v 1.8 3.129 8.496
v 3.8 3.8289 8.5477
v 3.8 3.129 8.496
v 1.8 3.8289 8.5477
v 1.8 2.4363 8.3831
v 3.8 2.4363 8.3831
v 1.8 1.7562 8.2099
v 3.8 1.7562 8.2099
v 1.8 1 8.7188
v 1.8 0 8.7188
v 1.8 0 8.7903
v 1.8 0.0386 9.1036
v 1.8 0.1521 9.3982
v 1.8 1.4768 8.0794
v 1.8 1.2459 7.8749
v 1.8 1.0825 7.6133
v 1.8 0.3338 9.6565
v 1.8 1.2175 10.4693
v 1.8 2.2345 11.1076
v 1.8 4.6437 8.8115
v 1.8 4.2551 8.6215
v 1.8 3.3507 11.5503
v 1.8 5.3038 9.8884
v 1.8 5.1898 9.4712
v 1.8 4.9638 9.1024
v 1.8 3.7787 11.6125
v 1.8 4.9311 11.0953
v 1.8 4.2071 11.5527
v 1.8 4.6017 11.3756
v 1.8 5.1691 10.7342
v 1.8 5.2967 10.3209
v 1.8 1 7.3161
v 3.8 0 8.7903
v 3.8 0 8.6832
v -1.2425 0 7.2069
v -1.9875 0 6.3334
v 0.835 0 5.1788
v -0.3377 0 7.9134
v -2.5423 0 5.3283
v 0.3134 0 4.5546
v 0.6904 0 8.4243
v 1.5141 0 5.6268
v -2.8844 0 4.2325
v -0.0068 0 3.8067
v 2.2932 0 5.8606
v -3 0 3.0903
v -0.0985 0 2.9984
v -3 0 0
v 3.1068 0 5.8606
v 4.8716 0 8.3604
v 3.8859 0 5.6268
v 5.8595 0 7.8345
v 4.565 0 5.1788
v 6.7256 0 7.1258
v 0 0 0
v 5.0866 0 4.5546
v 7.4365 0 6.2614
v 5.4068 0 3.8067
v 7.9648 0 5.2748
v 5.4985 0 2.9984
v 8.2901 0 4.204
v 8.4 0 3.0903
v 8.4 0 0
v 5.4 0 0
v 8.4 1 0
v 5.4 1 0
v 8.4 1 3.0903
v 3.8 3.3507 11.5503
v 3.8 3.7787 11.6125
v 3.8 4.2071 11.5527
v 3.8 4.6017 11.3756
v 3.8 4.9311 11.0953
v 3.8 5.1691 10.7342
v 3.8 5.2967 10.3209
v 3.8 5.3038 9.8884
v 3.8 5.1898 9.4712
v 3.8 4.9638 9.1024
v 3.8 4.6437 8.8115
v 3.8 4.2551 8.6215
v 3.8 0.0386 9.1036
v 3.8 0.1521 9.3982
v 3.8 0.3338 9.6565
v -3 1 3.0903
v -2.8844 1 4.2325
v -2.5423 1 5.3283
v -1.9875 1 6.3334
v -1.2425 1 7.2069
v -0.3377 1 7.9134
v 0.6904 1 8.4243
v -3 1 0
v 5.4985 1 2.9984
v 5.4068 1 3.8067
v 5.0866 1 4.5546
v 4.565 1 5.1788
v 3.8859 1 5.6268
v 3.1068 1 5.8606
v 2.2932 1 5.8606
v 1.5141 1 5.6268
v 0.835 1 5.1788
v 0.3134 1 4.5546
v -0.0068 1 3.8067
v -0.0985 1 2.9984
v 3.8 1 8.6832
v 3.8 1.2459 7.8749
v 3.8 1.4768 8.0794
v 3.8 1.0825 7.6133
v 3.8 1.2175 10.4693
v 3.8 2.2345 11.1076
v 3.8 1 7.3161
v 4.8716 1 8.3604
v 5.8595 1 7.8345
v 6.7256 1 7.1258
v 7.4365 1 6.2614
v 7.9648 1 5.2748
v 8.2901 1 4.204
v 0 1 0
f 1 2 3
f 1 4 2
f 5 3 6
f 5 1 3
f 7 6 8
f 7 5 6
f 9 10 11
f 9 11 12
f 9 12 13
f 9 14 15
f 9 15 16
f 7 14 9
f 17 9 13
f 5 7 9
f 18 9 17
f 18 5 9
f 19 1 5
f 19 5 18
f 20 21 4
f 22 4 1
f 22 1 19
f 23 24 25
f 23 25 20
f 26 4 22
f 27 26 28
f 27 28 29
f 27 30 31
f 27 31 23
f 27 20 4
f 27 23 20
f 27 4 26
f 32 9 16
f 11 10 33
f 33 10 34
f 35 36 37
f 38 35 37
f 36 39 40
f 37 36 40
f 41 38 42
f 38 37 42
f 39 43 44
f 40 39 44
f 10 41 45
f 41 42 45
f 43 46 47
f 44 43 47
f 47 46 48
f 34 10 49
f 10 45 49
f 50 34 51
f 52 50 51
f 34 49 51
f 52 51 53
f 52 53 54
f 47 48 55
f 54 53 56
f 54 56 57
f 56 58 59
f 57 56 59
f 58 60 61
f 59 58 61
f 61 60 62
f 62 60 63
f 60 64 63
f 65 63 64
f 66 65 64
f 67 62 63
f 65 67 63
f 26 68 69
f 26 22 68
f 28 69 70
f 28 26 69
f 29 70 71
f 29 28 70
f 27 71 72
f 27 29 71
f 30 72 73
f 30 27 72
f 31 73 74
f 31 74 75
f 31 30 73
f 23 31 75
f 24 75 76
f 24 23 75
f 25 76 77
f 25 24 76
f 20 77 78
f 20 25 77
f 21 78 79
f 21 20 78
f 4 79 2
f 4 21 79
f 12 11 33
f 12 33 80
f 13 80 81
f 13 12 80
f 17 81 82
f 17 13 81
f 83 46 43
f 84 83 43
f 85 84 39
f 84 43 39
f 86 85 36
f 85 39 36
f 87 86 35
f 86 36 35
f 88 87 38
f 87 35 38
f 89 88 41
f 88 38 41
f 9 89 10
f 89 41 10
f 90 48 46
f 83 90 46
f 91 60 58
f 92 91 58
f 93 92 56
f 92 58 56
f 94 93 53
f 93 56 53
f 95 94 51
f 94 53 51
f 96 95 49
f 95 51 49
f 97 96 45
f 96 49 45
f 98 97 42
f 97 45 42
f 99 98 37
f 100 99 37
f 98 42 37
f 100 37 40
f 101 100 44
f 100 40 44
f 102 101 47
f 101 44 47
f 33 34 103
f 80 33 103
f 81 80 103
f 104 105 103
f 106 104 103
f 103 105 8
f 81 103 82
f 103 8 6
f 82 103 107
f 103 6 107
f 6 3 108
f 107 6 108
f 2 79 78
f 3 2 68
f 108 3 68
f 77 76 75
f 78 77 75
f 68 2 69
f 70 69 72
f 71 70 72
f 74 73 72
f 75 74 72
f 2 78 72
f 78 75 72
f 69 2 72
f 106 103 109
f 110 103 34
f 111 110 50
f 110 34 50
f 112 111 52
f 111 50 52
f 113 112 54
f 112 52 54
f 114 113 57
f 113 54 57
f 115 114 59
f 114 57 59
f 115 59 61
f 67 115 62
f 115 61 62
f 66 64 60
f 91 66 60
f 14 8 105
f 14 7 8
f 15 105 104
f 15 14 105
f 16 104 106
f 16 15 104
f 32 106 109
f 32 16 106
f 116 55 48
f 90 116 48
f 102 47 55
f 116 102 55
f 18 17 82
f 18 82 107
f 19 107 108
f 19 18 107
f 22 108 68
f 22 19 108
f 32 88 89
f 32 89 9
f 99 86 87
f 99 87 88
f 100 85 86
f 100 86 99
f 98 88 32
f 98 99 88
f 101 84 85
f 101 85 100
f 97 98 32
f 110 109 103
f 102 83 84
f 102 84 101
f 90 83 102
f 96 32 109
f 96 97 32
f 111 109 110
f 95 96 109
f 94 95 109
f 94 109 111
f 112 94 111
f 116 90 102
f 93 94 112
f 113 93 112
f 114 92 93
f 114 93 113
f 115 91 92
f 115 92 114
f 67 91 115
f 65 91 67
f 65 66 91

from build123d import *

# Parameters (mm, degrees)
BOSS_EXTRUDE1_DEPTH      = 1
BOSS_EXTRUDE2_START      = 2.8
BOSS_EXTRUDE2_DEPTH      = 1
BOSS_EXTRUDE2_DEPTH_BACK = 1


with BuildPart() as part:
    # Sketch1 → Boss-Extrude1 (new body)
    with BuildSketch(Plane(origin=(0, 0, 0), x_dir=(1, 0, 0), z_dir=(0, 1, 0))):
        with BuildLine():
            Line((0, 0), (-3, 0))
            Line((-3, 0), (-3, -3.090307428))
            ThreePointArc((-3, -3.090307428), (2.7, -8.790307428), (8.4, -3.090307428))
            Line((8.4, -3.090307428), (8.4, 0))
            Line((8.4, 0), (5.4, 0))
            Line((5.4, 0), (5.498490641, -2.99838283))
            ThreePointArc((5.498490641, -2.99838283), (2.7, -5.890307428), (-0.098490641, -2.99838283))
            Line((-0.098490641, -2.99838283), (0, 0))
        make_face()
    extrude(amount=BOSS_EXTRUDE1_DEPTH)

    # Sketch2 → Boss-Extrude2 (add, two sides)
    with BuildSketch(Plane(origin=(0, 0, 0), x_dir=(0, 0, -1), z_dir=(1, 0, 0)).offset(BOSS_EXTRUDE2_START)) as boss_extrude2_sk:
        with BuildLine():
            Line((-6.335210042, 0), (-8.790307428, 0))
            ThreePointArc((-8.790307428, 0), (-9.254427116, 0.08633492), (-9.656455715, 0.333789578))
            ThreePointArc((-9.656455715, 0.333789578), (-10.811745574, 1.711404626), (-11.550251819, 3.350650307))
            ThreePointArc((-11.550251819, 3.350650307), (-10.32088682, 5.296716398), (-8.547723139, 3.828928236))
            ThreePointArc((-8.547723139, 3.828928236), (-8.447124365, 2.781446668), (-8.209910935, 1.756230818))
            ThreePointArc((-8.209910935, 1.756230818), (-7.874898379, 1.24587868), (-7.316117214, 1))
            Line((-7.316117214, 1), (-6.335210042, 1))
            Line((-6.335210042, 1), (-6.335210042, 0))
        make_face()
    extrude(amount=BOSS_EXTRUDE2_DEPTH)
    extrude(boss_extrude2_sk.sketch, amount=-BOSS_EXTRUDE2_DEPTH_BACK)


solid = part.part
